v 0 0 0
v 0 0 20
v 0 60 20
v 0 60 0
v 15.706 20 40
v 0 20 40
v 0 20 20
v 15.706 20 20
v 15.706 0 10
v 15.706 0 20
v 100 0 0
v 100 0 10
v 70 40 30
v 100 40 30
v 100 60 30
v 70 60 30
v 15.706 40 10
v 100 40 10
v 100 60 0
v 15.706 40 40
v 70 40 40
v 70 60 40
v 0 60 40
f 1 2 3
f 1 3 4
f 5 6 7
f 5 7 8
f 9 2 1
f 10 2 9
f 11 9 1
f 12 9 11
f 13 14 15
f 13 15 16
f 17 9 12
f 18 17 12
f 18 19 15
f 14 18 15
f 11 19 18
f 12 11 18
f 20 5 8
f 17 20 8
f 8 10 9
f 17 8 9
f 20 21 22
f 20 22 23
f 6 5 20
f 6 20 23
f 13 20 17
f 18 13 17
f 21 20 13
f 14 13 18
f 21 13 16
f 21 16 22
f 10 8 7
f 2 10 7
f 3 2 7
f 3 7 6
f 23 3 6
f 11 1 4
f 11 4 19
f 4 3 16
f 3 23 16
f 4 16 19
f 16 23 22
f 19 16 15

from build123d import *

# Parameters (mm, degrees)
F0_W     = 15.706341
F0_H     = 20
F1_DEPTH = 60
F2_DEPTH = 40
F3_DEPTH = 20


with BuildPart() as f1:
    # F0 (on Front) → F1 (new body)
    with BuildSketch(Plane.XZ):
        Polygon((0, 20), (0, 0), (100, 0), (100, 10), (15.706341, 10), (15.706341, 20), align=None)
        with Locations((7.853171, 30)):
            Rectangle(F0_W, F0_H)
        Polygon((15.706341, 40), (15.706341, 20), (15.706341, 10), (100, 10), (100, 30), (70, 30), (70, 40), align=None)
    extrude(amount=-F1_DEPTH)

    # F0 (on Front) → F2 (cut)
    with BuildSketch(Plane.XZ):
        Polygon((15.706341, 40), (15.706341, 20), (15.706341, 10), (100, 10), (100, 30), (70, 30), (70, 40), align=None)
    extrude(amount=-F2_DEPTH, mode=Mode.SUBTRACT)

    # F0 (on Front) → F3 (cut)
    with BuildSketch(Plane.XZ):
        with Locations((7.853171, 30)):
            Rectangle(F0_W, F0_H)
    extrude(amount=-F3_DEPTH, mode=Mode.SUBTRACT)


solid = f1.part
